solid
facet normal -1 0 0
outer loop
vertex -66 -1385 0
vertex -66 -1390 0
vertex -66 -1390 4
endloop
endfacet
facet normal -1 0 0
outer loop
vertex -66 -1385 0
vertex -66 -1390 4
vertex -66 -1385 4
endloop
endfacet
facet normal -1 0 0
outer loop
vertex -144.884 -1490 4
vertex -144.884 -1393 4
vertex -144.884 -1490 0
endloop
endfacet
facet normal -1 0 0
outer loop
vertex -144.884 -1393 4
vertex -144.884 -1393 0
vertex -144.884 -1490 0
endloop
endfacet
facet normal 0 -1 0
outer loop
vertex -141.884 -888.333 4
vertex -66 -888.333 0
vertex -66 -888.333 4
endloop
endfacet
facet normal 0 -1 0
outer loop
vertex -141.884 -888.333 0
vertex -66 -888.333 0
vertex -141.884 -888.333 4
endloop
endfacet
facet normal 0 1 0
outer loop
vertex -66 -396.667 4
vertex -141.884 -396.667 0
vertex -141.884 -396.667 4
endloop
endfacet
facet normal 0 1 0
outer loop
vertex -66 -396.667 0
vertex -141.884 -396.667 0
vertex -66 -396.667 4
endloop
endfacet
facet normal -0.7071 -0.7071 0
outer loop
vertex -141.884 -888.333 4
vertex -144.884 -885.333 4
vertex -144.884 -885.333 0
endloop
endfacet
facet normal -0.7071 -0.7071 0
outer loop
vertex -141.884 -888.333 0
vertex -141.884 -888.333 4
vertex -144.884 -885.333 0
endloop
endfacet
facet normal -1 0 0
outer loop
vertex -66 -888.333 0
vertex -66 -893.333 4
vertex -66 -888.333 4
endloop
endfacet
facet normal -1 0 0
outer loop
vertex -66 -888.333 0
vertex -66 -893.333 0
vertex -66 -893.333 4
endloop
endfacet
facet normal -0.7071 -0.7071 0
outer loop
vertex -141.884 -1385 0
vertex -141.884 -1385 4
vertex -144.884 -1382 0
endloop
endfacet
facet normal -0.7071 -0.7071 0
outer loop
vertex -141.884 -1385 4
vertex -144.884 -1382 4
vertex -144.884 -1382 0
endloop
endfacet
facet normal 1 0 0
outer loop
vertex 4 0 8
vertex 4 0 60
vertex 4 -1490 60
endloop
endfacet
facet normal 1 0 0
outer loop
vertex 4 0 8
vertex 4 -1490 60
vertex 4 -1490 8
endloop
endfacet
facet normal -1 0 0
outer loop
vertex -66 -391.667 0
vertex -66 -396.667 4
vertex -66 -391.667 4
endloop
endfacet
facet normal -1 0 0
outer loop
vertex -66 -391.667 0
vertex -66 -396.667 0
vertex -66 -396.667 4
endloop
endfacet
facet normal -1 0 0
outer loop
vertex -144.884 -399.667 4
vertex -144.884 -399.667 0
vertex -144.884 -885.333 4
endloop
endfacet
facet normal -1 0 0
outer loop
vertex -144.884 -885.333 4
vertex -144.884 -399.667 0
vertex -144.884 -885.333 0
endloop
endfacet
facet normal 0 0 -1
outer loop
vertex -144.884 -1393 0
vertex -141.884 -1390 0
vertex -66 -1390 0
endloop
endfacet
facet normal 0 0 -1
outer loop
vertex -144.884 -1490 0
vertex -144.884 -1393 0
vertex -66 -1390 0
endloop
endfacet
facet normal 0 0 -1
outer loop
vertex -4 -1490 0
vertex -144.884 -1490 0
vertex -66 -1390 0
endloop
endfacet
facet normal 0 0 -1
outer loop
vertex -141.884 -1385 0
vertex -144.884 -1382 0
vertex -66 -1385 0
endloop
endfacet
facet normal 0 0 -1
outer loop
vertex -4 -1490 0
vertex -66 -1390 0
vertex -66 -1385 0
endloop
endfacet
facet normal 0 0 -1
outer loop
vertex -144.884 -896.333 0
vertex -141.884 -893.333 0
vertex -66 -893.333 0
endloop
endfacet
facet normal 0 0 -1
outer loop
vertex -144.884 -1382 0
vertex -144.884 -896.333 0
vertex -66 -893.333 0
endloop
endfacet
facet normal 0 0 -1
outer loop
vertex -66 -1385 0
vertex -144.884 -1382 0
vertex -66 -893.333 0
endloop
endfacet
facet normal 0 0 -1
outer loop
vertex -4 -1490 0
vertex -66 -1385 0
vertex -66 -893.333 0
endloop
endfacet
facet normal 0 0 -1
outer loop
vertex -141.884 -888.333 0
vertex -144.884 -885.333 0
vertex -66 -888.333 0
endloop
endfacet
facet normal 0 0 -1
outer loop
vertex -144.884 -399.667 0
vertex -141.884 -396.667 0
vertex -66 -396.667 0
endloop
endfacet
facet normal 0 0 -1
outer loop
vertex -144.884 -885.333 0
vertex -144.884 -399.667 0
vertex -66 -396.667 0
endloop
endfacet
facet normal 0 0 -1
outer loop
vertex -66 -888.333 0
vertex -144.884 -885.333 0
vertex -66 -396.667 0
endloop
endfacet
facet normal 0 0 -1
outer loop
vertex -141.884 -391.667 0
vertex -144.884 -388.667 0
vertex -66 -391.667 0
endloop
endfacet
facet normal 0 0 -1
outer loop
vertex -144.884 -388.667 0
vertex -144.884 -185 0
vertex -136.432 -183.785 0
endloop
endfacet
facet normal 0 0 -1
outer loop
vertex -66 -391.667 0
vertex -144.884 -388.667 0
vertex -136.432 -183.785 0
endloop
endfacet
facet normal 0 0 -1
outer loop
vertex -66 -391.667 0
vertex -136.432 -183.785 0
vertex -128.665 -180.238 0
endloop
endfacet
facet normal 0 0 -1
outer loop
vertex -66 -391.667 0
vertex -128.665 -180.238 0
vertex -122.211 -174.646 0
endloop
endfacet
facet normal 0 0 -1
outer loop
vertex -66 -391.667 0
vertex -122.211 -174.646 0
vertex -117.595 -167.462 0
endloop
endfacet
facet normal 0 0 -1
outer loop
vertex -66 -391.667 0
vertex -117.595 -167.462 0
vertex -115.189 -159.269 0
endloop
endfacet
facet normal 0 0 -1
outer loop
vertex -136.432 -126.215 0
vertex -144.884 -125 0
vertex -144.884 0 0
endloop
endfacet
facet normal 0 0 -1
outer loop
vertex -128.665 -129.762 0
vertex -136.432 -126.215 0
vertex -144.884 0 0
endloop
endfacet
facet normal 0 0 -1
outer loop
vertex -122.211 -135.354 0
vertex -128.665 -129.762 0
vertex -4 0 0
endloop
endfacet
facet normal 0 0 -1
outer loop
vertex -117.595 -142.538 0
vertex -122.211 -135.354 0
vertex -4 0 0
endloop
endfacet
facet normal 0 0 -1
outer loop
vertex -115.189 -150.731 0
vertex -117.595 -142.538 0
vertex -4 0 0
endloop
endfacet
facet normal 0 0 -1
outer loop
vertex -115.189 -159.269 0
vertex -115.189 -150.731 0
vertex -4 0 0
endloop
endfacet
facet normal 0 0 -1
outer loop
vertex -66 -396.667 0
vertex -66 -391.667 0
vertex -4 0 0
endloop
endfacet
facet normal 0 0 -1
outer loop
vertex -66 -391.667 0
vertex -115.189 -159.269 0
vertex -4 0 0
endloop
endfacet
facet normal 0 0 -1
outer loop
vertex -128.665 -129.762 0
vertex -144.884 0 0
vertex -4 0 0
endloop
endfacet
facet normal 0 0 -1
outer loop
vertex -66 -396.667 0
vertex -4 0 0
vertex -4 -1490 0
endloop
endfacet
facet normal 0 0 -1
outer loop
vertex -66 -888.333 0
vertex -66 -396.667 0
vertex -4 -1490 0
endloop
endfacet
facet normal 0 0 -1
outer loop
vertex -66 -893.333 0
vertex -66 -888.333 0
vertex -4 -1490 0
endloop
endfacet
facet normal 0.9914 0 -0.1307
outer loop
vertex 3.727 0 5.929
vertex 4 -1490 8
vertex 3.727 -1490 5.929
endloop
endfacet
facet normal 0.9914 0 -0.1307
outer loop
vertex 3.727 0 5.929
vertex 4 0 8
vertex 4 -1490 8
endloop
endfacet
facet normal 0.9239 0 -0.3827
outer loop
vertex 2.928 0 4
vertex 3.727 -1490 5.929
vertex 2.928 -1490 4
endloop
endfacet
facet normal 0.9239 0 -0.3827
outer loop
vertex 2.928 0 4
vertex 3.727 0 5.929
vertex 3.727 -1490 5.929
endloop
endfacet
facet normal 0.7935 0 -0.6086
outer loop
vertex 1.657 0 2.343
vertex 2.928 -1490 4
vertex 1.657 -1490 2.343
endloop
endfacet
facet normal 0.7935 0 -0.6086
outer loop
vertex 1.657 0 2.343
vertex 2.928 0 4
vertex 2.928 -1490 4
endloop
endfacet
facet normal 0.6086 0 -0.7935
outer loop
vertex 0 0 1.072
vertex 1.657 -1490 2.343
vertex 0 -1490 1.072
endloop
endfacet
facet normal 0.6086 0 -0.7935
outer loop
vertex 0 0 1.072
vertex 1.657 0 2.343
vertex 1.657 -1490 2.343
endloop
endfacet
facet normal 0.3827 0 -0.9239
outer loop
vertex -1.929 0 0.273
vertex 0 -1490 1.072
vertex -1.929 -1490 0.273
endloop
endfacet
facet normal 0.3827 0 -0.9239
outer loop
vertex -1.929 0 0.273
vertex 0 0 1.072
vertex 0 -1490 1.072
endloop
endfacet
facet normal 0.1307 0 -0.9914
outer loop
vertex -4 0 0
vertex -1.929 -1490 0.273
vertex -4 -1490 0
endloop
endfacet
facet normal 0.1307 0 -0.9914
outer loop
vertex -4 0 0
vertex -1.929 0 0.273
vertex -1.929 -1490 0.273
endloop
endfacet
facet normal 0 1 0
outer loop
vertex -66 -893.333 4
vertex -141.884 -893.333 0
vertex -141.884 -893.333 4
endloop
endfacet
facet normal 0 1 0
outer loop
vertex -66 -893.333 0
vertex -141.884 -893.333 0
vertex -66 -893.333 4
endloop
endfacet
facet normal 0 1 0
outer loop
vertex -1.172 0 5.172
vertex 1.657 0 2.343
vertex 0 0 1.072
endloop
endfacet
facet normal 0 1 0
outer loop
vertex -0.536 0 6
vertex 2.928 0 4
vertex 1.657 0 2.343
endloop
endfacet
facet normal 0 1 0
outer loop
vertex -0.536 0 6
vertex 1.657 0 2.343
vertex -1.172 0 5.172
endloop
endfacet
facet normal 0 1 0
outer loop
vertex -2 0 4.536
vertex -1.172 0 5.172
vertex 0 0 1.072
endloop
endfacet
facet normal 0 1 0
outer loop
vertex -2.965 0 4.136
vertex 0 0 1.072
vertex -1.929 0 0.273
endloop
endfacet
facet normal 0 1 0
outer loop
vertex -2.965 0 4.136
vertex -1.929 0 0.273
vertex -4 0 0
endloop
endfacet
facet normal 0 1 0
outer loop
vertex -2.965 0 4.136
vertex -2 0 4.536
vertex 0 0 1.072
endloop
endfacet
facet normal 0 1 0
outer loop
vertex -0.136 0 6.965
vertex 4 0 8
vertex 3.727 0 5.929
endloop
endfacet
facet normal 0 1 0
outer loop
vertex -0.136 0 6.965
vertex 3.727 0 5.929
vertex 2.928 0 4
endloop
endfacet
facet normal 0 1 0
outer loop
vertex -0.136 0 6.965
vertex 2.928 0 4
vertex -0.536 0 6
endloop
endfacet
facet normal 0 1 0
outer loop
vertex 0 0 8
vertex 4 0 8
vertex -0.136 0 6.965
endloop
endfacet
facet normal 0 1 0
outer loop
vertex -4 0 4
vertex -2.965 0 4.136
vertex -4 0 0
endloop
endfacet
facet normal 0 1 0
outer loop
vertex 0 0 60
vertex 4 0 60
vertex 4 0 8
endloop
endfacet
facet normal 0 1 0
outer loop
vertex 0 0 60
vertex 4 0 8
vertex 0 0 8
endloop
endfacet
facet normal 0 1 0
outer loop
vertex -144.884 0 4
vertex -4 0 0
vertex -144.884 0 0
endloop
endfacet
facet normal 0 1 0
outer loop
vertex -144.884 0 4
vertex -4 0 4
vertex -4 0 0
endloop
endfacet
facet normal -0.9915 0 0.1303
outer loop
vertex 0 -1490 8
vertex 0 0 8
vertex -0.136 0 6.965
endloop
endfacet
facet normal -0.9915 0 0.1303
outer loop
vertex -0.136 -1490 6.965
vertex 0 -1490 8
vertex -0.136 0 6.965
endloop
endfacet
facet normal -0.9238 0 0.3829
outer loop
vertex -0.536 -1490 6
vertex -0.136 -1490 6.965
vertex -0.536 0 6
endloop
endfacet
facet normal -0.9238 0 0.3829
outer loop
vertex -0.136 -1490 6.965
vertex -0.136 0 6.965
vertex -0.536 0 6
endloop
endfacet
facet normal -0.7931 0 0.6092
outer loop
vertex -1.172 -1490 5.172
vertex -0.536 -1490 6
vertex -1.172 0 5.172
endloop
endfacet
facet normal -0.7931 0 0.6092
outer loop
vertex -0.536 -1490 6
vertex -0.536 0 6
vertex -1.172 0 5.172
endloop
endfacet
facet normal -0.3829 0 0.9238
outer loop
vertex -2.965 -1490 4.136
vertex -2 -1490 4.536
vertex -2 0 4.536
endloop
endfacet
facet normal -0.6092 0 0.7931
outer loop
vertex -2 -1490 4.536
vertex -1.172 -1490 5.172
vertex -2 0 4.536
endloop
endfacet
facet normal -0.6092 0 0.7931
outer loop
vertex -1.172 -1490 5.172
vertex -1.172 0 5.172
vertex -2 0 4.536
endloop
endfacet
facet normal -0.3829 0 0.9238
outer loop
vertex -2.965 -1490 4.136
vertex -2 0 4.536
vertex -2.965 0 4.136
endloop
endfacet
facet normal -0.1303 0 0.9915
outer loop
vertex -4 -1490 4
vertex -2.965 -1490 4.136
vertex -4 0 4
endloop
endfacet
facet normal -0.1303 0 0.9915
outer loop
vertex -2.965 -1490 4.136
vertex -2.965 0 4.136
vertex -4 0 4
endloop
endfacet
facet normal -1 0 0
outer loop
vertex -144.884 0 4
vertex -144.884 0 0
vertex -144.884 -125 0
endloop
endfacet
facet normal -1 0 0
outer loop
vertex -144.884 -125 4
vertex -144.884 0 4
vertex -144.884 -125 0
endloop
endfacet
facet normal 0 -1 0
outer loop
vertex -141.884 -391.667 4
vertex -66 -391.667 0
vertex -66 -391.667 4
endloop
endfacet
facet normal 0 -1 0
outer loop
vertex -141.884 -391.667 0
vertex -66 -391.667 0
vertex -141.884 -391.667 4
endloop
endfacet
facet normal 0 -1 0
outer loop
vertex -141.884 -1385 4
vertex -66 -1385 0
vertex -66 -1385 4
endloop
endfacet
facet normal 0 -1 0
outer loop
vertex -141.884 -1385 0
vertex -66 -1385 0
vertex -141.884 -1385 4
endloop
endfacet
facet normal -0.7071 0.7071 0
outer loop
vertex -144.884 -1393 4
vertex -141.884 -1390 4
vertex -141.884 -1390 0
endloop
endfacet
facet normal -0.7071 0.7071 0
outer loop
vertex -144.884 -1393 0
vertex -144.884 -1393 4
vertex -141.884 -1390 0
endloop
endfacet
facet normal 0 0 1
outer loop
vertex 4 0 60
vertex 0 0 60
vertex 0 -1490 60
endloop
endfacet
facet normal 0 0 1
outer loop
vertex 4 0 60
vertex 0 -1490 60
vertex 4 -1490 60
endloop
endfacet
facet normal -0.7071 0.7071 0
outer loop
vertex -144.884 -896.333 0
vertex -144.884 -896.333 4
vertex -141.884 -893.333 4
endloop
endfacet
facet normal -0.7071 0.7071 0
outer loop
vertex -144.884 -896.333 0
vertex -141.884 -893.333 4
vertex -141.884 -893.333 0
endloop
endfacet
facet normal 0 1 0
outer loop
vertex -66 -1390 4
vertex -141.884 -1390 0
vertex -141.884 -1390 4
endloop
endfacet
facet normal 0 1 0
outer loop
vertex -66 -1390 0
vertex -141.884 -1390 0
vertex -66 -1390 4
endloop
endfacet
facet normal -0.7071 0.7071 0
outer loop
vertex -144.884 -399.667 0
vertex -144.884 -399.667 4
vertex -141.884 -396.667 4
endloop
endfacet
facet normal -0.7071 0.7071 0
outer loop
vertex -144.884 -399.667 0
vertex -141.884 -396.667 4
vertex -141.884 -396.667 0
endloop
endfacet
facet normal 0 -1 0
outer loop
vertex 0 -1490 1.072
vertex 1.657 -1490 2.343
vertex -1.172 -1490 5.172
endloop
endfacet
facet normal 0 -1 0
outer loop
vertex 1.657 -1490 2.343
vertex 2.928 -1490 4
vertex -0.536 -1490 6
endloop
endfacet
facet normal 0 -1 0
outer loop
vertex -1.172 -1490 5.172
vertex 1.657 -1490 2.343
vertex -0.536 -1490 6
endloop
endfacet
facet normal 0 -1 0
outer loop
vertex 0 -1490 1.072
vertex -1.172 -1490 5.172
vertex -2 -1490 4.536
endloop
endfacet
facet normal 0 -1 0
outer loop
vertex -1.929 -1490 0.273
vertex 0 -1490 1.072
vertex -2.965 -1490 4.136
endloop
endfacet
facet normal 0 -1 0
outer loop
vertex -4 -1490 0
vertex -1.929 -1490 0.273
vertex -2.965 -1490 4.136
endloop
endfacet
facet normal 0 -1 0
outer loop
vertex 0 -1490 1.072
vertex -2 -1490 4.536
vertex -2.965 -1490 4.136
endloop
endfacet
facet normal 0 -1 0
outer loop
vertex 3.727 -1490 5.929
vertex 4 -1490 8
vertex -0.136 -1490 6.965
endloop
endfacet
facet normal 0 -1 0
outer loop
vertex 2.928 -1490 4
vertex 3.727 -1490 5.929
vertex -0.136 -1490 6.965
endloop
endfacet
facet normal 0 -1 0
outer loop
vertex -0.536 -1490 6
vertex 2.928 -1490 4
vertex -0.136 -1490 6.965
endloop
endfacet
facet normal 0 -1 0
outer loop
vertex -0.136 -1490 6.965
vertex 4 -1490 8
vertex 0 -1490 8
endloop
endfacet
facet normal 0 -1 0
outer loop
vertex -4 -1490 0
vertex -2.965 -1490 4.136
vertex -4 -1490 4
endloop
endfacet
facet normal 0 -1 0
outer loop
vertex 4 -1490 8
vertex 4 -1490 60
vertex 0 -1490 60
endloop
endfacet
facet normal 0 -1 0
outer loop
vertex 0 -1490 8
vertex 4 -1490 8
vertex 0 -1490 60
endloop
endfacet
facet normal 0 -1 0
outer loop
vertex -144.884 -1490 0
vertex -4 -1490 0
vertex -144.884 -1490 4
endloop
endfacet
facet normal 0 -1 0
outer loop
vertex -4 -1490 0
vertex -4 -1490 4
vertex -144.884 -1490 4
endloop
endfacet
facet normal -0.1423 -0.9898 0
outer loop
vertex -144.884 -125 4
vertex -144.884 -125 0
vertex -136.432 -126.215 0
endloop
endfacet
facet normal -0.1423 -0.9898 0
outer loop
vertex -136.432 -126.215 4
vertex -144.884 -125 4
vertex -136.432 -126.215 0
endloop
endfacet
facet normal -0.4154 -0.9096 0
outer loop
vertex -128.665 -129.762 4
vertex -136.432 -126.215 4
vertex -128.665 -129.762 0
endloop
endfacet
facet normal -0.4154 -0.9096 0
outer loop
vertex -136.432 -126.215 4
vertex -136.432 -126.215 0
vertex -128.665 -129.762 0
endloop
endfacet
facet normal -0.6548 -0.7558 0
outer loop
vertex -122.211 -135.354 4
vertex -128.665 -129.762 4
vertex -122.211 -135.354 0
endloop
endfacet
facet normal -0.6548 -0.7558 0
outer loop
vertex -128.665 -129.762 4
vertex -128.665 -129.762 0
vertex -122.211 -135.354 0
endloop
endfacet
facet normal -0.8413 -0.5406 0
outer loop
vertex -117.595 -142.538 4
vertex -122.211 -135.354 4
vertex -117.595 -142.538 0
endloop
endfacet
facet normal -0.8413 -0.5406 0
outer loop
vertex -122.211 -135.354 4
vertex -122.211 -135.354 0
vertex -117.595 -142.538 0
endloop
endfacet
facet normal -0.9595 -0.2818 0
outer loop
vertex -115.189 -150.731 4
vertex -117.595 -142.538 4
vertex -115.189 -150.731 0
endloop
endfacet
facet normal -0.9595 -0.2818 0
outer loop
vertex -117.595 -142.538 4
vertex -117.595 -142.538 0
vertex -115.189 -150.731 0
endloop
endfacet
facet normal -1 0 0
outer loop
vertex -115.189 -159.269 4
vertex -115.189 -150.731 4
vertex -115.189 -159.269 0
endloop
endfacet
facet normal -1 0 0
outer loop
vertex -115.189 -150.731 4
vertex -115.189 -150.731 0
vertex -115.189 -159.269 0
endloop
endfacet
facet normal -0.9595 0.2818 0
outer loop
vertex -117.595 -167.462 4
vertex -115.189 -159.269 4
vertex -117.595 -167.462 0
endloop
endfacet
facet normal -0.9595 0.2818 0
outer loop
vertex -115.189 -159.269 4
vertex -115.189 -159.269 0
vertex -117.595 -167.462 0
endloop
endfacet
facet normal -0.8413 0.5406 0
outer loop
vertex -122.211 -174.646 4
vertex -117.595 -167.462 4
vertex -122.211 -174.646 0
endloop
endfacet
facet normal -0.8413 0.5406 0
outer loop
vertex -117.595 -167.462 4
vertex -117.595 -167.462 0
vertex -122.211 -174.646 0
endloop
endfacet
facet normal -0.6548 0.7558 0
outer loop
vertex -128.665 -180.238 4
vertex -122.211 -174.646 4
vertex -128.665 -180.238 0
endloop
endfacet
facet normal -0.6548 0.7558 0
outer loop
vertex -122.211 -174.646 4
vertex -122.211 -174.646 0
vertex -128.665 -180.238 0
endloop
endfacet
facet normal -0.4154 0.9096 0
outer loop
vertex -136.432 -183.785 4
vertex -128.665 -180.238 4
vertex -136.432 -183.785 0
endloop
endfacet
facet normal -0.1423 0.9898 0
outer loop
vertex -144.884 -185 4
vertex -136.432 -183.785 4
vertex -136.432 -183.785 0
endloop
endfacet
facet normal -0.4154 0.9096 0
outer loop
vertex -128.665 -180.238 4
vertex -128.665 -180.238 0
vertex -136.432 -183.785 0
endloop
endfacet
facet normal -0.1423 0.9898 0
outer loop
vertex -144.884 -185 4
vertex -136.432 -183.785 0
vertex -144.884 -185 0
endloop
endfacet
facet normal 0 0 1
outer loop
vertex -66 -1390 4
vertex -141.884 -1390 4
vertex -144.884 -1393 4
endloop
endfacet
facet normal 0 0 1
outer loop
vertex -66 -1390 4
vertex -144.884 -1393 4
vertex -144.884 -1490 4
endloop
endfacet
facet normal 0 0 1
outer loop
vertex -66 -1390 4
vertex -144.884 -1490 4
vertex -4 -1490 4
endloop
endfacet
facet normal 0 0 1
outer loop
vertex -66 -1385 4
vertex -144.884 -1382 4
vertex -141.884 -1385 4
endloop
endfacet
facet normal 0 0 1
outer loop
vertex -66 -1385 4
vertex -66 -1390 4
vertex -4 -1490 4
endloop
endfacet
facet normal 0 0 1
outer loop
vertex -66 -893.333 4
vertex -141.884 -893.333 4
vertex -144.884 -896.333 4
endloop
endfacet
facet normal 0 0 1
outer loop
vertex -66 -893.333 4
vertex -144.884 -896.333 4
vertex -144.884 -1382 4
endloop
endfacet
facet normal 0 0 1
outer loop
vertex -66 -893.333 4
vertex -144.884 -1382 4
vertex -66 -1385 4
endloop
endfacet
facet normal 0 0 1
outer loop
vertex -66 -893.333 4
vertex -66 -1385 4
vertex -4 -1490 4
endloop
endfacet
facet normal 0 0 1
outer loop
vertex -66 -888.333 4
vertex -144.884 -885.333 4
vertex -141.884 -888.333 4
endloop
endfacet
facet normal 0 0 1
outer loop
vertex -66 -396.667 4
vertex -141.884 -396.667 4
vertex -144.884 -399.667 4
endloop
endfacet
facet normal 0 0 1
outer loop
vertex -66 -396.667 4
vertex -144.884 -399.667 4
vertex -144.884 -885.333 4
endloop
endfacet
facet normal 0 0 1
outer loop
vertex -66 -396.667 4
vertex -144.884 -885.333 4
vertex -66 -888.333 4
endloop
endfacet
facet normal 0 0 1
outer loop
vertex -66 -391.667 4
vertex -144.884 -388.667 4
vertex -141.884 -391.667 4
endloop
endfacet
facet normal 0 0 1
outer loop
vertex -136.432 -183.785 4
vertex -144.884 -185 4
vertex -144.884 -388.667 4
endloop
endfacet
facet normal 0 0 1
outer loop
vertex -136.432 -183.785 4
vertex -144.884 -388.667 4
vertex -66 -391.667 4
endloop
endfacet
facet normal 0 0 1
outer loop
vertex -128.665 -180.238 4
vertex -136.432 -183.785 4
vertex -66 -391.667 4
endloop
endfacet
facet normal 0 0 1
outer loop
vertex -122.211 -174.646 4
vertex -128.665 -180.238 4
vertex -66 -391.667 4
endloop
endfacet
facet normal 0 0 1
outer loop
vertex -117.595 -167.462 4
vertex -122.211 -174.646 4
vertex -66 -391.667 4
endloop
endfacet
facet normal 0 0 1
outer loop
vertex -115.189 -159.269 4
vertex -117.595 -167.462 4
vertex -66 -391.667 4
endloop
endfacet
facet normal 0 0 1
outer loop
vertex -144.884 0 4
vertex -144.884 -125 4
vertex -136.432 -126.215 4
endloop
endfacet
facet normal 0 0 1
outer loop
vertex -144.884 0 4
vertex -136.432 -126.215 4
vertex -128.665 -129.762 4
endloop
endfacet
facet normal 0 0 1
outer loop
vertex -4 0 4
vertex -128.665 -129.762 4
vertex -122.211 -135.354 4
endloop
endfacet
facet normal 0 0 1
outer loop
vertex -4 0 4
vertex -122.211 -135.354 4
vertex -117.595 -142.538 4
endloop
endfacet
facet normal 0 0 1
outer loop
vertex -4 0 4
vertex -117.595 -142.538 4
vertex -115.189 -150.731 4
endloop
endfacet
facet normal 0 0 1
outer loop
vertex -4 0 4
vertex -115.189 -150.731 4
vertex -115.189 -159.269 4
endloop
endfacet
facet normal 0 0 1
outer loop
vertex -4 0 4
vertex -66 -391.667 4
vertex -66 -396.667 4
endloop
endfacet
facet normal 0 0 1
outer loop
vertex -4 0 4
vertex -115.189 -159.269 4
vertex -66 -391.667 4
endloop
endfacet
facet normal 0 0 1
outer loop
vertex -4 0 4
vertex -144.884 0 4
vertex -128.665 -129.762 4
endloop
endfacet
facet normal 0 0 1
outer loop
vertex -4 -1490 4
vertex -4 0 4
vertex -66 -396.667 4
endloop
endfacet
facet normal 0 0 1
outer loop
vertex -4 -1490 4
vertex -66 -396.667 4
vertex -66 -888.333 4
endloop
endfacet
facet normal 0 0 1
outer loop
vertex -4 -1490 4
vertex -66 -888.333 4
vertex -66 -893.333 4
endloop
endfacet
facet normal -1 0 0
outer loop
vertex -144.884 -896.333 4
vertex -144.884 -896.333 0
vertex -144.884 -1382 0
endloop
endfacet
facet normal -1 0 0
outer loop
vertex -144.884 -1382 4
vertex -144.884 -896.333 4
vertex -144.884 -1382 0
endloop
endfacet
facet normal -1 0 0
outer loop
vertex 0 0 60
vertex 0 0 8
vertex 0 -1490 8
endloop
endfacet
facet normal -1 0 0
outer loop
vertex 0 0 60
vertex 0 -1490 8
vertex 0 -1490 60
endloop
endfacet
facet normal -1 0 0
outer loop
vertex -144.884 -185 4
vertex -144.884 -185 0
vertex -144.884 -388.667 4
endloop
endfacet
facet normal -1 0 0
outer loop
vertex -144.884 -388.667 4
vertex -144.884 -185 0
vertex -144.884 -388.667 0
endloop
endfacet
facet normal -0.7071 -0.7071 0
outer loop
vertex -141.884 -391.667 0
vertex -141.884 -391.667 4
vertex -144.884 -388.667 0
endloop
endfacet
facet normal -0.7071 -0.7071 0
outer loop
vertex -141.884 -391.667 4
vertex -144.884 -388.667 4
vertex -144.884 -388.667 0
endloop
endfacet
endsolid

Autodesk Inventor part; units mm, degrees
ref_plane "YZ Plane" through (0, 0, 0) normal (1, 0, 0) x (0, 1, 0)
ref_plane "XZ Plane" through (0, 0, 0) normal (0, 1, 0) x (-1, 0, 0)
ref_plane "XY Plane" through (0, 0, 0) normal (0, 0, 1) x (1, 0, 0)
sketch "Sketch1" plane through (0, 0, 0) normal (0, 0, 1) x (1, 0, 0)
  line L0 (0, 0) -> (-144.8838, 0)
  line L1 (-144.8838, 0) -> (-144.8838, -1490)
  line L2 (-144.8838, -1490) -> (0, -1490)
  line L3 (0, -1490) -> (0, 0)
  line L4 (-144.8838, -1390) -> (-66, -1390)
  line L5 (-66, -1390) -> (-66, -1385)
  line L6 (-66, -1385) -> (-144.8838, -1385)
  line L7 (-144.8838, -1385) -> (-144.8838, -1390)
  line L8 (-144.8838, -893.3333) -> (-66, -893.3333)
  line L9 (-66, -893.3333) -> (-66, -888.3333)
  line L10 (-66, -888.3333) -> (-144.8838, -888.3333)
  line L11 (-144.8838, -888.3333) -> (-144.8838, -893.3333)
  line L12 (-144.8838, -396.6667) -> (-66, -396.6667)
  line L13 (-66, -396.6667) -> (-66, -391.6667)
  line L14 (-66, -391.6667) -> (-144.8838, -391.6667)
  line L15 (-144.8838, -391.6667) -> (-144.8838, -396.6667)
  circle A0 centre (-144.8838, -155) radius 30
  point P0 (-144.8838, -391.6667)
  point P1 (-144.8838, -1385)
  point P2 (-144.8838, -125)
  point P3 (-144.8838, -185)
  dimension "d0" = 1490
  dimension "d1" = 144.8838
  dimension "d2" = 5
  dimension "d4" = 100
  dimension "d7" = 496.6667
  dimension "d23" = 66
  dimension "d28" = 60
  dimension "d29" = 1335
extrude "Plate1" add sketch "Sketch1" along normal blind 4 contours L3 L2 L1 L4 L5 L6 L8 L9 L10 L12 L13 L14 A0 L0
sketch "Sketch2" plane through (4, 0, 0) normal (-1, 0, 0) x (0, -1, 0)
  line L0 (1490, 0) -> (0, 0)
  line L1 (0, 0) -> (0, 60)
  line L2 (0, 60) -> (1490, 60)
  line L3 (1490, 60) -> (1490, 0)
edge flange "Flange1" height 60 angle 90 thickness 4 bend radius 4 thickness toward (-1, 0, 0) relief tear relief width 4 relief depth 2 edges at (0, -745, 4) wall of the first edge with corners at (4, -1490, 0) (4, 0, 0) (4, 0, 60) (4, -1490, 60)
bend "Bend1"
corner "Corner1"
chamfer "Corner Chamfer1" distance 3 angle 45 6 edges at (-144.8838, -1390, 2) (-144.8838, -1385, 2) (-144.8838, -893.3333, 2) (-144.8838, -888.3333, 2) (-144.8838, -391.6667, 2) (-144.8838, -396.6667, 2)
equation "\"d0\" = Стрингер_длина"
equation "\"d1\" = стрингер_глубина_5"
equation "\"d2\" = паз_под_стрингер_толщина"
equation "\"d7\" = 0.333333 * Стрингер_длина"
equation "\"d23\" = паз_под_стрингер_глубина - Thickness"
equation "\"d28\" = 2 * радиус_выреза_под_сварку"
equation "\"d12\" = Thickness"
equation "\"d13\" = BendReliefWidth"
equation "\"d14\" = BendReliefDepth"
equation "\"d15\" = MinimumRemnant"
equation "\"d16\" = TransitionRadius"
equation "\"d17\" = ребро_усилителей"
equation "\"d19\" = BendRadius"
equation "\"d20\" = CornerReliefSize"
equation "\"d21\" = GapSize"
equation "\"d22\" = JacobiRadiusSize"
equation "\"BendRadius\" = Thickness"
equation "\"BendReliefWidth\" = Thickness"
equation "\"BendReliefDepth\" = 0.5 * Thickness"
equation "\"CornerReliefSize\" = 4 * Thickness"
equation "\"MinimumRemnant\" = 2 * Thickness"
equation "\"TransitionRadius\" = BendRadius"
equation "\"JacobiRadiusSize\" = BendRadius"
equation "\"GapSize\" = Thickness"
equation "\"Стрингер_длина\" = 1490"
equation "\"стрингер_глубина_5\" = 144.883787"
equation "\"паз_под_стрингер_толщина\" = 5"
equation "\"паз_под_стрингер_глубина\" = 70"
equation "\"Thickness\" = 4"
equation "\"радиус_выреза_под_сварку\" = 30"
equation "\"ребро_усилителей\" = 60"
properties part number "GBK 0203 stringer 5" material "Steel"
